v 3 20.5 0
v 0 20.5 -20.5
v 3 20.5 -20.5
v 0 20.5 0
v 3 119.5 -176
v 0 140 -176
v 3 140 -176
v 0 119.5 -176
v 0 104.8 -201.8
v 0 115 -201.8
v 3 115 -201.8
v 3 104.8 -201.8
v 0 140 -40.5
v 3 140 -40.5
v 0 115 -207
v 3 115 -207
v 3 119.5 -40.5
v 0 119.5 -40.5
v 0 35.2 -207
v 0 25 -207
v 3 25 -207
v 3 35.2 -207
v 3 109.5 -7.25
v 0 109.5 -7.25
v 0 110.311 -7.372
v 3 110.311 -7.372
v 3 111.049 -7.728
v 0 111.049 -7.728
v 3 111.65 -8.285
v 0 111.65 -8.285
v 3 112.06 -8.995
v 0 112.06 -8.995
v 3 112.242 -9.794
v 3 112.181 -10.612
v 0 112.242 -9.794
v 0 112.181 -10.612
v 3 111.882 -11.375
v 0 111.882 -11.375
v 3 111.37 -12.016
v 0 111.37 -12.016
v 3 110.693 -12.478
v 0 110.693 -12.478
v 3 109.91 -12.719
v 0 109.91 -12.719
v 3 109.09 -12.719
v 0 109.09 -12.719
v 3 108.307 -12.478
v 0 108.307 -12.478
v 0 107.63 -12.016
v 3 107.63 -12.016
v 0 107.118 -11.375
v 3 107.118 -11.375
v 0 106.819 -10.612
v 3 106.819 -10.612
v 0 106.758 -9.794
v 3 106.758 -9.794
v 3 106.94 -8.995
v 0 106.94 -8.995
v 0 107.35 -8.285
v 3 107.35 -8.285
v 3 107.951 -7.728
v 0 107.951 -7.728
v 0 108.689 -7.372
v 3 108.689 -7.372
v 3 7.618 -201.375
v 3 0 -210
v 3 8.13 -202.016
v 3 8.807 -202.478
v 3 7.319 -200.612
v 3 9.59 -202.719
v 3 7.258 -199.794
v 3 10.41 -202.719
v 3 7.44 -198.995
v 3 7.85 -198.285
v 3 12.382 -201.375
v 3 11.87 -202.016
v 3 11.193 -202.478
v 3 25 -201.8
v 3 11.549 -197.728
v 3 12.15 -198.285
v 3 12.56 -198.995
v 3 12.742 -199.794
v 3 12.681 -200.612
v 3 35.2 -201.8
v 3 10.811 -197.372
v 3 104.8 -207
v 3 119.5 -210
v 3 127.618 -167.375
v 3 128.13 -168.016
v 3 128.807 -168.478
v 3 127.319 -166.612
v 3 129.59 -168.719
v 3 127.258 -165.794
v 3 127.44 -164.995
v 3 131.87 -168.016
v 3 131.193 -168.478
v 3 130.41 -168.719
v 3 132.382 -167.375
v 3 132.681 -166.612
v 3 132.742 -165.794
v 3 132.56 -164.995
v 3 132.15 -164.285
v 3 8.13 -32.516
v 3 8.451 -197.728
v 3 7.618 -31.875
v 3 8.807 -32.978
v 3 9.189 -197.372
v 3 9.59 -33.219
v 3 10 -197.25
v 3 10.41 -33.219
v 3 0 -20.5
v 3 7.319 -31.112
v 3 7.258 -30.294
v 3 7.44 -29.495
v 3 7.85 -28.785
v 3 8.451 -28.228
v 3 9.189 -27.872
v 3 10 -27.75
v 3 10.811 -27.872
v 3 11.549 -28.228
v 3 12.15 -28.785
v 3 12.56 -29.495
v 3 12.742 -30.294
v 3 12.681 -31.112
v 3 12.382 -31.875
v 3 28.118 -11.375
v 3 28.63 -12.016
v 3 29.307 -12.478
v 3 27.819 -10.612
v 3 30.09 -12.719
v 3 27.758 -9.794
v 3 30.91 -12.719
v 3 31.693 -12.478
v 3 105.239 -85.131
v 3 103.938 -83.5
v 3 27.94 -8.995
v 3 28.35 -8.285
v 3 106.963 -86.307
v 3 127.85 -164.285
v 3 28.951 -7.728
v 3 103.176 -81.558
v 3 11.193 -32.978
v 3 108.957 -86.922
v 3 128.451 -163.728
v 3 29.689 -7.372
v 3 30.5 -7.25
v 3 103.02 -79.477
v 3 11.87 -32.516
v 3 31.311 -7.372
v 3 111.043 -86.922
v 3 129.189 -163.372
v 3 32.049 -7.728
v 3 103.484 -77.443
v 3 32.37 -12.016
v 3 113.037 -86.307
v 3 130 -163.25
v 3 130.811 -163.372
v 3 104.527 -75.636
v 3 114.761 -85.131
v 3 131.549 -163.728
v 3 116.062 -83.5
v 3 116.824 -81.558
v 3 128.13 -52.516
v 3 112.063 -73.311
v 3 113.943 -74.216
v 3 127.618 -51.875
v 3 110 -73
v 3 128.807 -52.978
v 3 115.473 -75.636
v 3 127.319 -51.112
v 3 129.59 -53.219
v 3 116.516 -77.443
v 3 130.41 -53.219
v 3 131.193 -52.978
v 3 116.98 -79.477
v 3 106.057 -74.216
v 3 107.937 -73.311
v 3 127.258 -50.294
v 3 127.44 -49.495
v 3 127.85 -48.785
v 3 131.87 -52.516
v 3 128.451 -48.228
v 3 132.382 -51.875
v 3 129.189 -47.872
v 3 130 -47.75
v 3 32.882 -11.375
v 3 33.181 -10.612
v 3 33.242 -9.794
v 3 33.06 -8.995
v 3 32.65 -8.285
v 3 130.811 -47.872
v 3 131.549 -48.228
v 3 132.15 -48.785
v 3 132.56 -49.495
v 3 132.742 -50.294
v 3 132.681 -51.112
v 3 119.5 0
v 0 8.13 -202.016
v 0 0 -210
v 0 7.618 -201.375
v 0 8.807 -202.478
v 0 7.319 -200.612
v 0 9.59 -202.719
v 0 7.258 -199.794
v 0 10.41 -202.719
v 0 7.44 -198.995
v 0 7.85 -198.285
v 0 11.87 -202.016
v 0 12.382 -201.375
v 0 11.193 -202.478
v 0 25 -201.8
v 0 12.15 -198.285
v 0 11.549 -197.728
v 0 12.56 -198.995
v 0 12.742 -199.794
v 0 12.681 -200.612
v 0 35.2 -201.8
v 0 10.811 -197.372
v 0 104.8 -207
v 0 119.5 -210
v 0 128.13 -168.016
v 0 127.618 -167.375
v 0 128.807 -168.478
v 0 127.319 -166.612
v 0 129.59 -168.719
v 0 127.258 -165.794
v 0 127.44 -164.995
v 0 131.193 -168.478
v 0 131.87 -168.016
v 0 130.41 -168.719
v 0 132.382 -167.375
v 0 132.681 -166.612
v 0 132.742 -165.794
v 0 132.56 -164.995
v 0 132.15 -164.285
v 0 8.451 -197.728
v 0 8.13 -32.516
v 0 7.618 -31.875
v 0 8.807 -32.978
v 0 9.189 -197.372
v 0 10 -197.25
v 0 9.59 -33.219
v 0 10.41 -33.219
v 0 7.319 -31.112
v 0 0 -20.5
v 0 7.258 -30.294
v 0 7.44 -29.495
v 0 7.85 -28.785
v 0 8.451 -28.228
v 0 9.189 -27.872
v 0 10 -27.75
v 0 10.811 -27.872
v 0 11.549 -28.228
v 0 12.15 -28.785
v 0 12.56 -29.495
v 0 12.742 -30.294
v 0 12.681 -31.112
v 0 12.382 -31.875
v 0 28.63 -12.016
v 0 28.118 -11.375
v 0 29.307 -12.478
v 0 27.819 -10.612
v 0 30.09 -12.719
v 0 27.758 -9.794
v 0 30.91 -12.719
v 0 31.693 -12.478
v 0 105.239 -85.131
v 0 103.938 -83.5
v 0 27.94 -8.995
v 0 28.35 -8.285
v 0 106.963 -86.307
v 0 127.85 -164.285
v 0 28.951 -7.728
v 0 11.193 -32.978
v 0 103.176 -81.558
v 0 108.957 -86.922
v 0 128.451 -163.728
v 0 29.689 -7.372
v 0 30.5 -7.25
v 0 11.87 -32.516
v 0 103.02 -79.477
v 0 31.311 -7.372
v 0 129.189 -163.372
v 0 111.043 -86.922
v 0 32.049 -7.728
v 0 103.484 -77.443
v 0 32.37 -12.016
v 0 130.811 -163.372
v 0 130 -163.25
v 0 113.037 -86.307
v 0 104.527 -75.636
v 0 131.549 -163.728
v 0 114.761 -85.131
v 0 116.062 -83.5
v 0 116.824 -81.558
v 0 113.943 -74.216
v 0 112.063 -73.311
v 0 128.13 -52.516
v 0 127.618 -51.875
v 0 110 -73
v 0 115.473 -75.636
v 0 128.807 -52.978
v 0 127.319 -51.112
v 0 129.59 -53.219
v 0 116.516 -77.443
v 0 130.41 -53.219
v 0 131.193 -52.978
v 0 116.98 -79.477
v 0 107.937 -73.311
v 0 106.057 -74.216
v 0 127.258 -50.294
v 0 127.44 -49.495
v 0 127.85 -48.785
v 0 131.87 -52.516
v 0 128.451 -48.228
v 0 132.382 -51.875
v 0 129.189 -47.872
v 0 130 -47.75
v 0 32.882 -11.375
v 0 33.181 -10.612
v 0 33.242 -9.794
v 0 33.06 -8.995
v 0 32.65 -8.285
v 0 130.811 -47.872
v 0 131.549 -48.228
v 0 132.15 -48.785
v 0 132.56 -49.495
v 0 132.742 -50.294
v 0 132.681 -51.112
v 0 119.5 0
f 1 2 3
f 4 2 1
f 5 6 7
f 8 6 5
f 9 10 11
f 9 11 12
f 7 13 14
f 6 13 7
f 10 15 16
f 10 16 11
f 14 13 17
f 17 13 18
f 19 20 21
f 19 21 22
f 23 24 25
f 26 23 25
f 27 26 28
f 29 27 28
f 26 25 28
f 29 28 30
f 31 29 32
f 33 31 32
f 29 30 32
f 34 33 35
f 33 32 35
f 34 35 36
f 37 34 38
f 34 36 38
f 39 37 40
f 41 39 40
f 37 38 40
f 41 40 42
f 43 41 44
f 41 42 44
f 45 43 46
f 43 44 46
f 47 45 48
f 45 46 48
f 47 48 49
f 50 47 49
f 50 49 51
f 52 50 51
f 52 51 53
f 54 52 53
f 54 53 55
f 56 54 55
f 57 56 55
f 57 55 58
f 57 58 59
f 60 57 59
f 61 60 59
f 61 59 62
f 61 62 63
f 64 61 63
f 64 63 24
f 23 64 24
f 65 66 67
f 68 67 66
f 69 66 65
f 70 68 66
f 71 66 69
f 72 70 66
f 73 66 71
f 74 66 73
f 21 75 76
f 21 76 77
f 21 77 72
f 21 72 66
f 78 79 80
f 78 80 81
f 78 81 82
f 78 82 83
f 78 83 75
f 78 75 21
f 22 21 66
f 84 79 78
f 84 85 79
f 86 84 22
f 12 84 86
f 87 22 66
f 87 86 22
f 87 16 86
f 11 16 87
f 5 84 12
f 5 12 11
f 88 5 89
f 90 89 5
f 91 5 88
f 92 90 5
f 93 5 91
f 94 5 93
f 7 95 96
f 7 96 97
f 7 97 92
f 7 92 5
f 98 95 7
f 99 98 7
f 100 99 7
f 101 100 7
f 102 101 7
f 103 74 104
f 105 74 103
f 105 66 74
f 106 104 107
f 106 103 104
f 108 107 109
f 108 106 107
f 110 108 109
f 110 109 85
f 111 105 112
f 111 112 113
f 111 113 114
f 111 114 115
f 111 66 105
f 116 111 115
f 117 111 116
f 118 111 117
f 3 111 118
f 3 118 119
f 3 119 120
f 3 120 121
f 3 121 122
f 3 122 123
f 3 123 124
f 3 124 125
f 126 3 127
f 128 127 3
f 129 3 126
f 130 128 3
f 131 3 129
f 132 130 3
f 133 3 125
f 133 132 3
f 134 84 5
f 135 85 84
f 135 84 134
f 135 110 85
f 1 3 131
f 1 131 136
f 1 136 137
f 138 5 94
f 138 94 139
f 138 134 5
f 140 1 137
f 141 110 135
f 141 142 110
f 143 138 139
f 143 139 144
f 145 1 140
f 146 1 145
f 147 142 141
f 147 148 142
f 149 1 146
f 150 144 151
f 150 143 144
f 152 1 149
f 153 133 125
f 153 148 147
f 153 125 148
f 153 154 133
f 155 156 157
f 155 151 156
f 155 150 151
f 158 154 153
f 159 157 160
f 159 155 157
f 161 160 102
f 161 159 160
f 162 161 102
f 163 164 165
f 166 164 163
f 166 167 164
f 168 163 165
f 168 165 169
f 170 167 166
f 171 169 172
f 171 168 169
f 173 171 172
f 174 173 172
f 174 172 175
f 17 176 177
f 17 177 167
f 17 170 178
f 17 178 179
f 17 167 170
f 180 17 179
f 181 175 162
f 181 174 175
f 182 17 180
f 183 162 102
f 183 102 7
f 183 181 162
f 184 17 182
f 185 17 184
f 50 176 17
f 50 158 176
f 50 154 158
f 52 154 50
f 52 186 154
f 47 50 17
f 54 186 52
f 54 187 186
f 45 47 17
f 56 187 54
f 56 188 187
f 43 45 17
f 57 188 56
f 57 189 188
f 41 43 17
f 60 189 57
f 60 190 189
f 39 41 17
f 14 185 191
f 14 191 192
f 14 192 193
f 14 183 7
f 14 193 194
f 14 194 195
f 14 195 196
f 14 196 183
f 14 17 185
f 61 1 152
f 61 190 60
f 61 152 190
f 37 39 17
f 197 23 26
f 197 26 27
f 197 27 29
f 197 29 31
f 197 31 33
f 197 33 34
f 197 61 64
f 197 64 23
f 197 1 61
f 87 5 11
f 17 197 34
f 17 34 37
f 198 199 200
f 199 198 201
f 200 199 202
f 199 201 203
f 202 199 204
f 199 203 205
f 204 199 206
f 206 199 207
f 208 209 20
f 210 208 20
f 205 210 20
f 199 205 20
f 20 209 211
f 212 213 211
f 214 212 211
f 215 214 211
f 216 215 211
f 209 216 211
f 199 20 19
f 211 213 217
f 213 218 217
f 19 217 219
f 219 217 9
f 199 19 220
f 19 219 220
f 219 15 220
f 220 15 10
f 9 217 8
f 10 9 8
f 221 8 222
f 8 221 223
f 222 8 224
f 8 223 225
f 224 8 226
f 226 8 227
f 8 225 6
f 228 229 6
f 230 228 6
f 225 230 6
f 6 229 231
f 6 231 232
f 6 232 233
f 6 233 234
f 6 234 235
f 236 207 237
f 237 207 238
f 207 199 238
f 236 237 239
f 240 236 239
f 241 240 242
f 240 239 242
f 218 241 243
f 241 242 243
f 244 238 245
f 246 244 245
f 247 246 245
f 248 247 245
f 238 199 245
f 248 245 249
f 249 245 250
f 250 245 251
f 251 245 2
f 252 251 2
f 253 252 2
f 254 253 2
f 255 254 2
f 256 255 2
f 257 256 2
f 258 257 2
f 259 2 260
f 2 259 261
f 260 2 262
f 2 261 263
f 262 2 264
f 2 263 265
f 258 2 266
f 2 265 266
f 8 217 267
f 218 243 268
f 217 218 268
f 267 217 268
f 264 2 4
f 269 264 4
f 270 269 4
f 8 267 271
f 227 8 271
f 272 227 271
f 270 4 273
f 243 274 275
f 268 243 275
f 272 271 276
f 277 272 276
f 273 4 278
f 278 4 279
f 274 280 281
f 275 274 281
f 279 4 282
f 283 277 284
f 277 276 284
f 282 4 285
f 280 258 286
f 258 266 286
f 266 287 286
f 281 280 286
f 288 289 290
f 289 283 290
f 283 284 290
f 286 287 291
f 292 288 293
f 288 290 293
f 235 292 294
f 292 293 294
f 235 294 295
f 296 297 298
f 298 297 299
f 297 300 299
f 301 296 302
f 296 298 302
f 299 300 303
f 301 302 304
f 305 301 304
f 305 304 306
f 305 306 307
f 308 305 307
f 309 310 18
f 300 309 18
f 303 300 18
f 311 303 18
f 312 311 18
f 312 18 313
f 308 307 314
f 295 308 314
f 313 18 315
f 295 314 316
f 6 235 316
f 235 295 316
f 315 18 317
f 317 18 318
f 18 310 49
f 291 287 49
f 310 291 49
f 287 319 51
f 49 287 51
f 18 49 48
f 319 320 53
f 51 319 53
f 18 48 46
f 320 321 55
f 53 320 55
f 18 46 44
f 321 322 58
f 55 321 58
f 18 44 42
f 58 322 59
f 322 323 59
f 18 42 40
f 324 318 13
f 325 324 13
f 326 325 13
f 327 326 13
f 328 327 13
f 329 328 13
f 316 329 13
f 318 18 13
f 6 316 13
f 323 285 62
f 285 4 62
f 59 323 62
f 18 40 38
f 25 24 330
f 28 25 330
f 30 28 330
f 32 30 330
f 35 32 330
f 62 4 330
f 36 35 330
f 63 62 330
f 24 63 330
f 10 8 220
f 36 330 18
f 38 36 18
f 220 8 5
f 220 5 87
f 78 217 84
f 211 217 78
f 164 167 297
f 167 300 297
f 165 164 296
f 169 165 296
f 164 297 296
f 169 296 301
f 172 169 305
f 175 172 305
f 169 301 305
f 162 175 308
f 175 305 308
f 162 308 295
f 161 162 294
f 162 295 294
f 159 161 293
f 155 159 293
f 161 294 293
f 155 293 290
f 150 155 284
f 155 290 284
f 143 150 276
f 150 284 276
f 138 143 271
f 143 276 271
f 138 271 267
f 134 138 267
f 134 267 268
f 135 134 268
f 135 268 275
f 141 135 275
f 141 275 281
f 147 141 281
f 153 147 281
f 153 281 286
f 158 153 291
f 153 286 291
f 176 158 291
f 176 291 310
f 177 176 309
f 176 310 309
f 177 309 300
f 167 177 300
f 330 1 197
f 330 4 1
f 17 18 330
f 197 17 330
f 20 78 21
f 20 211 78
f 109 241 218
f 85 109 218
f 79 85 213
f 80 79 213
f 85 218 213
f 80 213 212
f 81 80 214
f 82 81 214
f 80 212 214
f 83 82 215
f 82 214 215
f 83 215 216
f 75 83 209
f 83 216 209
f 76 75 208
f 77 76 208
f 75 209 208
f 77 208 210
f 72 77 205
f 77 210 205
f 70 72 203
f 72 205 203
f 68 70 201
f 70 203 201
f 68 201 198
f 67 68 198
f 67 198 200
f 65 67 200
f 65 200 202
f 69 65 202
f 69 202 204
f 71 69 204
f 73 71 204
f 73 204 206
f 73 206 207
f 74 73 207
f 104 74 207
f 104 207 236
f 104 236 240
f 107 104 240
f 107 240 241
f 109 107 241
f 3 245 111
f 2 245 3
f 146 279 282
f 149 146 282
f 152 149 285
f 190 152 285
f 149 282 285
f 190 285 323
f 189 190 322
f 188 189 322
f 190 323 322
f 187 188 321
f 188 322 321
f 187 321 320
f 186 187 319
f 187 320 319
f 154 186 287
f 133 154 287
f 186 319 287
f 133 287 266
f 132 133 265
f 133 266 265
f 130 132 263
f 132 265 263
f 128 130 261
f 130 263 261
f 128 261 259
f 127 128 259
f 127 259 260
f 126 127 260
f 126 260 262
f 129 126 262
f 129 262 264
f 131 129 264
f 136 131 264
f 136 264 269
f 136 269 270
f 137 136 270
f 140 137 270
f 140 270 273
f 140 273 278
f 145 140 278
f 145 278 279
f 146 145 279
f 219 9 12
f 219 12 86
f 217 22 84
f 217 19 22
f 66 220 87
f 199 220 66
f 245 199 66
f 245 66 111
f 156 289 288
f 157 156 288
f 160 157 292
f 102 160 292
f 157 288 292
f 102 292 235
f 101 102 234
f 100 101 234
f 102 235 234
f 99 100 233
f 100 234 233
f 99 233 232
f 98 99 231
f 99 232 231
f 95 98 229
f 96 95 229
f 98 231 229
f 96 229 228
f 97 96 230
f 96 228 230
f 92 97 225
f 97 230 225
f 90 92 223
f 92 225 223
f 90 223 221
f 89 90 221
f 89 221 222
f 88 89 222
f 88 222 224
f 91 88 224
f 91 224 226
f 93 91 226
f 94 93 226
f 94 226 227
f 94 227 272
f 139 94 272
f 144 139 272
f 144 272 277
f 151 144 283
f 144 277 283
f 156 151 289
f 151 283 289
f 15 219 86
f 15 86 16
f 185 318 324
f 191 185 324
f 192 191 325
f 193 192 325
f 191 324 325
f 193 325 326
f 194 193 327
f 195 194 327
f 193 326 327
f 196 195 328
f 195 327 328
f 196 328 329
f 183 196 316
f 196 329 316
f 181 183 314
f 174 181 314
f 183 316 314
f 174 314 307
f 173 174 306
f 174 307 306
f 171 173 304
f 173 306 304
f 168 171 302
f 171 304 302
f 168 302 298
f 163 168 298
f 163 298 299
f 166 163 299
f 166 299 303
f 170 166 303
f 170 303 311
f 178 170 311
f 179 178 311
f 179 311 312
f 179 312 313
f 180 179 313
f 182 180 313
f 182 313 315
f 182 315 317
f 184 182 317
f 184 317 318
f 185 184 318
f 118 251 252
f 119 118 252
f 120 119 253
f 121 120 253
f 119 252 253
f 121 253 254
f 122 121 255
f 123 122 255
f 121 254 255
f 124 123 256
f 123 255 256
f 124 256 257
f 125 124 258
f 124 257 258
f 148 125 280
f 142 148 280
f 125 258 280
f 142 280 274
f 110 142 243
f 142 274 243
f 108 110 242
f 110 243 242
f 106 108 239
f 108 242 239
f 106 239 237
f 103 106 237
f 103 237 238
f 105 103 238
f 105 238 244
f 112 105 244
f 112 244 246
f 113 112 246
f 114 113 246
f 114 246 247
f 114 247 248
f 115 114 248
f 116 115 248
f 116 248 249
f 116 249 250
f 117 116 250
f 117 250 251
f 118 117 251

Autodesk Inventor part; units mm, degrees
ref_plane "YZ Plane" through (0, 0, 0) normal (1, 0, 0) x (0, 1, 0)
ref_plane "XZ Plane" through (0, 0, 0) normal (0, 1, 0) x (-1, 0, 0)
ref_plane "XY Plane" through (0, 0, 0) normal (0, 0, 1) x (1, 0, 0)
sketch "Sketch1" plane through (0, 0, 0) normal (1, 0, 0) x (0, 1, 0)
  line L0 (0, 0) -> (140, 0)
  line L1 (140, 0) -> (140, -210)
  line L2 (140, -210) -> (0, -210)
  line L3 (0, -210) -> (0, 0)
  dimension "d0" = 210
  dimension "d1" = 140
extrude "Extrusion1" add sketch "Sketch1" along normal blind 3
sketch "Sketch2" plane through (0, 0, 0) normal (-1, 0, 0) x (0, 0, 1)
  line L0 (0, 0) -> (-20.5, 0)
  line L1 (-20.5, 0) -> (-20.5, 20.5)
  line L2 (-20.5, 20.5) -> (0, 20.5)
  line L3 (0, 20.5) -> (0, 0)
  line L4 (-210, 140) -> (0, 140) projected
  line L5 (0, 140) -> (-40.5, 140)
  line L6 (-40.5, 140) -> (-40.5, 119.5)
  line L7 (-40.5, 119.5) -> (0, 119.5)
  line L8 (0, 119.5) -> (0, 140)
  line L9 (-210, 140) -> (-176, 140)
  line L10 (-176, 140) -> (-176, 119.5)
  line L11 (-176, 119.5) -> (-210, 119.5)
  line L12 (-210, 119.5) -> (-210, 140)
  point P0 (-176, 140)
  dimension "d4" = 20.5
  dimension "d5" = 20.5
  dimension "d6" = 40.5
  dimension "d7" = 20.5
  dimension "d8" = 34
extrude "Extrusion2" cut sketch "Sketch2" against normal blind 3
sketch "Sketch3" plane through (0, 0, 0) normal (-1, 0, 0) x (0, 0, 1)
  circle A0 centre (-10, 30.5) radius 2.75
  line L0 (-20.5, 20.5) -> (0, 20.5) projected
  line L1 (0, 119.5) -> (0, 20.5) projected
  circle A1 centre (-10, 109.5) radius 2.75
  circle A2 centre (-50.5, 130) radius 2.75
  circle A3 centre (-166, 130) radius 2.75
  circle A4 centre (-200, 10) radius 2.75
  circle A5 centre (-30.5, 10) radius 2.75
  line L2 (-20.5, 0) -> (-210, 0) projected
  line L3 (-20.5, 0) -> (-20.5, 20.5) projected
  line L4 (-210, 0) -> (-210, 119.5) projected
  line L5 (-176, 140) -> (-176, 119.5) projected
  line L6 (-176, 140) -> (-40.5, 140) projected
  line L7 (-40.5, 119.5) -> (-40.5, 140) projected
  line L8 (0, 119.5) -> (-40.5, 119.5) projected
  point P0 (0, 0)
  dimension "d11" = 5.5
  dimension "d12" = 10
  dimension "d13" = 10
  dimension "d14" = 10
  dimension "d15" = 10
  dimension "d16" = 10
  dimension "d17" = 10
  dimension "d18" = 10
  dimension "d19" = 10
  dimension "d20" = 10
  dimension "d21" = 10
  dimension "d22" = 10
  dimension "d23" = 10
  dimension "d24" = 5.5
  dimension "d25" = 5.5
  dimension "d26" = 5.5
  dimension "d27" = 5.5
  dimension "d28" = 5.5
extrude "Extrusion3" cut sketch "Sketch3" against normal blind 3
sketch "Sketch4" plane through (0, 0, 0) normal (-1, 0, 0) x (0, 0, 1)
  line L0 (-201.8, 25) -> (-207, 25)
  line L1 (-207, 25) -> (-207, 35.2)
  line L2 (-207, 35.2) -> (-201.8, 35.2)
  line L3 (-201.8, 35.2) -> (-201.8, 25)
  line L4 (-201.8, 104.8) -> (-207, 104.8)
  line L5 (-207, 104.8) -> (-207, 115)
  line L6 (-207, 115) -> (-201.8, 115)
  line L7 (-201.8, 115) -> (-201.8, 104.8)
  line L8 (-210, 0) -> (-210, 119.5) projected
  line L9 (-20.5, 0) -> (-210, 0) projected
  line L10 (-176, 119.5) -> (-210, 119.5) projected
  line L11 (-176, 140) -> (-40.5, 140) projected
  point P0 (0, 0)
  dimension "d31" = 3
  dimension "d32" = 25
  dimension "d34" = 10.2
  dimension "d35" = 10.2
  dimension "d36" = 5.2
  dimension "d37" = 25
extrude "Extrusion4" cut sketch "Sketch4" against normal blind 3
sketch "Sketch5" plane through (0, 0, 0) normal (-1, 0, 0) x (0, 0, 1)
  point P0 (0, 0)
sketch "Sketch6" plane through (0, 0, 0) normal (-1, 0, 0) x (0, 0, 1)
  circle A0 centre (-80, 110) radius 7
  line L0 (-176, 140) -> (-40.5, 140) projected
  line L1 (0, 119.5) -> (0, 20.5) projected
  line L2 (-176, 140) -> (-176, 119.5) projected
  point P0 (0, 0)
  dimension "d40" = 14
  dimension "d41" = 30
  dimension "d43" = 80
extrude "Extrusion5" cut sketch "Sketch6" against normal blind 3
equation "\"d5\" = d4"
equation "\"d13\" = d12"
equation "\"d14\" = d12"
equation "\"d15\" = d12"
equation "\"d16\" = d12"
equation "\"d17\" = d12"
equation "\"d18\" = d12"
equation "\"d19\" = d12"
equation "\"d20\" = d12"
equation "\"d21\" = d12"
equation "\"d22\" = d12"
equation "\"d23\" = d12"
equation "\"d24\" = d11"
equation "\"d25\" = d11"
equation "\"d26\" = d11"
equation "\"d27\" = d11"
equation "\"d28\" = d11"
properties part number "Steckerplatte_hint"
